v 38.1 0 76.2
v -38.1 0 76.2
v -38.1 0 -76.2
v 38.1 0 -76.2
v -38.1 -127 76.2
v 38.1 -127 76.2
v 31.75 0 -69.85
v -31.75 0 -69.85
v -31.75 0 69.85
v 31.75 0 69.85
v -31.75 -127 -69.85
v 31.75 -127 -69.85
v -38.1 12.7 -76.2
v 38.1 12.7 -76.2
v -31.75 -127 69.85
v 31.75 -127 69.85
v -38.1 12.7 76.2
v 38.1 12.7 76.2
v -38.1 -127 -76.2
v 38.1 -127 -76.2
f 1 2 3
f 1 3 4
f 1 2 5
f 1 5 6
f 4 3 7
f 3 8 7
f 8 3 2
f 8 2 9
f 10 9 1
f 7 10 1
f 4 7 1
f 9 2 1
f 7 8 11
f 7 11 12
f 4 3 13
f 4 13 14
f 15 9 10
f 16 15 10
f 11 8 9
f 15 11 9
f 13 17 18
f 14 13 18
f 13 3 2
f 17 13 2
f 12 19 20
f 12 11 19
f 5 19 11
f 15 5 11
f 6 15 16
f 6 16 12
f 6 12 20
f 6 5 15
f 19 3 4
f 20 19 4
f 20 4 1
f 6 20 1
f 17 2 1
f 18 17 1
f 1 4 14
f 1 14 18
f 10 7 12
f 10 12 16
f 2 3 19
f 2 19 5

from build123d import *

# Parameters (mm, degrees)
F0_W     = 76.2
F0_H     = 152.4
F0_W_2   = 63.5
F0_H_2   = 139.7
F1_DEPTH = 127
F2_DEPTH = 12.7


with BuildPart() as f1:
    # F0 (on Front) → F1 (new body)
    with BuildSketch(Plane.XZ):
        Rectangle(F0_W, F0_H)
        Rectangle(F0_W_2, F0_H_2, mode=Mode.SUBTRACT)
    extrude(amount=F1_DEPTH)


with BuildPart() as f2:
    # F0 (on Front) → F2 (new body)
    with BuildSketch(Plane.XZ):
        Rectangle(F0_W, F0_H)
        Rectangle(F0_W_2, F0_H_2, mode=Mode.SUBTRACT)
        Rectangle(F0_W_2, F0_H_2)
    extrude(amount=-F2_DEPTH)


solid = Compound([f1.part, f2.part])
